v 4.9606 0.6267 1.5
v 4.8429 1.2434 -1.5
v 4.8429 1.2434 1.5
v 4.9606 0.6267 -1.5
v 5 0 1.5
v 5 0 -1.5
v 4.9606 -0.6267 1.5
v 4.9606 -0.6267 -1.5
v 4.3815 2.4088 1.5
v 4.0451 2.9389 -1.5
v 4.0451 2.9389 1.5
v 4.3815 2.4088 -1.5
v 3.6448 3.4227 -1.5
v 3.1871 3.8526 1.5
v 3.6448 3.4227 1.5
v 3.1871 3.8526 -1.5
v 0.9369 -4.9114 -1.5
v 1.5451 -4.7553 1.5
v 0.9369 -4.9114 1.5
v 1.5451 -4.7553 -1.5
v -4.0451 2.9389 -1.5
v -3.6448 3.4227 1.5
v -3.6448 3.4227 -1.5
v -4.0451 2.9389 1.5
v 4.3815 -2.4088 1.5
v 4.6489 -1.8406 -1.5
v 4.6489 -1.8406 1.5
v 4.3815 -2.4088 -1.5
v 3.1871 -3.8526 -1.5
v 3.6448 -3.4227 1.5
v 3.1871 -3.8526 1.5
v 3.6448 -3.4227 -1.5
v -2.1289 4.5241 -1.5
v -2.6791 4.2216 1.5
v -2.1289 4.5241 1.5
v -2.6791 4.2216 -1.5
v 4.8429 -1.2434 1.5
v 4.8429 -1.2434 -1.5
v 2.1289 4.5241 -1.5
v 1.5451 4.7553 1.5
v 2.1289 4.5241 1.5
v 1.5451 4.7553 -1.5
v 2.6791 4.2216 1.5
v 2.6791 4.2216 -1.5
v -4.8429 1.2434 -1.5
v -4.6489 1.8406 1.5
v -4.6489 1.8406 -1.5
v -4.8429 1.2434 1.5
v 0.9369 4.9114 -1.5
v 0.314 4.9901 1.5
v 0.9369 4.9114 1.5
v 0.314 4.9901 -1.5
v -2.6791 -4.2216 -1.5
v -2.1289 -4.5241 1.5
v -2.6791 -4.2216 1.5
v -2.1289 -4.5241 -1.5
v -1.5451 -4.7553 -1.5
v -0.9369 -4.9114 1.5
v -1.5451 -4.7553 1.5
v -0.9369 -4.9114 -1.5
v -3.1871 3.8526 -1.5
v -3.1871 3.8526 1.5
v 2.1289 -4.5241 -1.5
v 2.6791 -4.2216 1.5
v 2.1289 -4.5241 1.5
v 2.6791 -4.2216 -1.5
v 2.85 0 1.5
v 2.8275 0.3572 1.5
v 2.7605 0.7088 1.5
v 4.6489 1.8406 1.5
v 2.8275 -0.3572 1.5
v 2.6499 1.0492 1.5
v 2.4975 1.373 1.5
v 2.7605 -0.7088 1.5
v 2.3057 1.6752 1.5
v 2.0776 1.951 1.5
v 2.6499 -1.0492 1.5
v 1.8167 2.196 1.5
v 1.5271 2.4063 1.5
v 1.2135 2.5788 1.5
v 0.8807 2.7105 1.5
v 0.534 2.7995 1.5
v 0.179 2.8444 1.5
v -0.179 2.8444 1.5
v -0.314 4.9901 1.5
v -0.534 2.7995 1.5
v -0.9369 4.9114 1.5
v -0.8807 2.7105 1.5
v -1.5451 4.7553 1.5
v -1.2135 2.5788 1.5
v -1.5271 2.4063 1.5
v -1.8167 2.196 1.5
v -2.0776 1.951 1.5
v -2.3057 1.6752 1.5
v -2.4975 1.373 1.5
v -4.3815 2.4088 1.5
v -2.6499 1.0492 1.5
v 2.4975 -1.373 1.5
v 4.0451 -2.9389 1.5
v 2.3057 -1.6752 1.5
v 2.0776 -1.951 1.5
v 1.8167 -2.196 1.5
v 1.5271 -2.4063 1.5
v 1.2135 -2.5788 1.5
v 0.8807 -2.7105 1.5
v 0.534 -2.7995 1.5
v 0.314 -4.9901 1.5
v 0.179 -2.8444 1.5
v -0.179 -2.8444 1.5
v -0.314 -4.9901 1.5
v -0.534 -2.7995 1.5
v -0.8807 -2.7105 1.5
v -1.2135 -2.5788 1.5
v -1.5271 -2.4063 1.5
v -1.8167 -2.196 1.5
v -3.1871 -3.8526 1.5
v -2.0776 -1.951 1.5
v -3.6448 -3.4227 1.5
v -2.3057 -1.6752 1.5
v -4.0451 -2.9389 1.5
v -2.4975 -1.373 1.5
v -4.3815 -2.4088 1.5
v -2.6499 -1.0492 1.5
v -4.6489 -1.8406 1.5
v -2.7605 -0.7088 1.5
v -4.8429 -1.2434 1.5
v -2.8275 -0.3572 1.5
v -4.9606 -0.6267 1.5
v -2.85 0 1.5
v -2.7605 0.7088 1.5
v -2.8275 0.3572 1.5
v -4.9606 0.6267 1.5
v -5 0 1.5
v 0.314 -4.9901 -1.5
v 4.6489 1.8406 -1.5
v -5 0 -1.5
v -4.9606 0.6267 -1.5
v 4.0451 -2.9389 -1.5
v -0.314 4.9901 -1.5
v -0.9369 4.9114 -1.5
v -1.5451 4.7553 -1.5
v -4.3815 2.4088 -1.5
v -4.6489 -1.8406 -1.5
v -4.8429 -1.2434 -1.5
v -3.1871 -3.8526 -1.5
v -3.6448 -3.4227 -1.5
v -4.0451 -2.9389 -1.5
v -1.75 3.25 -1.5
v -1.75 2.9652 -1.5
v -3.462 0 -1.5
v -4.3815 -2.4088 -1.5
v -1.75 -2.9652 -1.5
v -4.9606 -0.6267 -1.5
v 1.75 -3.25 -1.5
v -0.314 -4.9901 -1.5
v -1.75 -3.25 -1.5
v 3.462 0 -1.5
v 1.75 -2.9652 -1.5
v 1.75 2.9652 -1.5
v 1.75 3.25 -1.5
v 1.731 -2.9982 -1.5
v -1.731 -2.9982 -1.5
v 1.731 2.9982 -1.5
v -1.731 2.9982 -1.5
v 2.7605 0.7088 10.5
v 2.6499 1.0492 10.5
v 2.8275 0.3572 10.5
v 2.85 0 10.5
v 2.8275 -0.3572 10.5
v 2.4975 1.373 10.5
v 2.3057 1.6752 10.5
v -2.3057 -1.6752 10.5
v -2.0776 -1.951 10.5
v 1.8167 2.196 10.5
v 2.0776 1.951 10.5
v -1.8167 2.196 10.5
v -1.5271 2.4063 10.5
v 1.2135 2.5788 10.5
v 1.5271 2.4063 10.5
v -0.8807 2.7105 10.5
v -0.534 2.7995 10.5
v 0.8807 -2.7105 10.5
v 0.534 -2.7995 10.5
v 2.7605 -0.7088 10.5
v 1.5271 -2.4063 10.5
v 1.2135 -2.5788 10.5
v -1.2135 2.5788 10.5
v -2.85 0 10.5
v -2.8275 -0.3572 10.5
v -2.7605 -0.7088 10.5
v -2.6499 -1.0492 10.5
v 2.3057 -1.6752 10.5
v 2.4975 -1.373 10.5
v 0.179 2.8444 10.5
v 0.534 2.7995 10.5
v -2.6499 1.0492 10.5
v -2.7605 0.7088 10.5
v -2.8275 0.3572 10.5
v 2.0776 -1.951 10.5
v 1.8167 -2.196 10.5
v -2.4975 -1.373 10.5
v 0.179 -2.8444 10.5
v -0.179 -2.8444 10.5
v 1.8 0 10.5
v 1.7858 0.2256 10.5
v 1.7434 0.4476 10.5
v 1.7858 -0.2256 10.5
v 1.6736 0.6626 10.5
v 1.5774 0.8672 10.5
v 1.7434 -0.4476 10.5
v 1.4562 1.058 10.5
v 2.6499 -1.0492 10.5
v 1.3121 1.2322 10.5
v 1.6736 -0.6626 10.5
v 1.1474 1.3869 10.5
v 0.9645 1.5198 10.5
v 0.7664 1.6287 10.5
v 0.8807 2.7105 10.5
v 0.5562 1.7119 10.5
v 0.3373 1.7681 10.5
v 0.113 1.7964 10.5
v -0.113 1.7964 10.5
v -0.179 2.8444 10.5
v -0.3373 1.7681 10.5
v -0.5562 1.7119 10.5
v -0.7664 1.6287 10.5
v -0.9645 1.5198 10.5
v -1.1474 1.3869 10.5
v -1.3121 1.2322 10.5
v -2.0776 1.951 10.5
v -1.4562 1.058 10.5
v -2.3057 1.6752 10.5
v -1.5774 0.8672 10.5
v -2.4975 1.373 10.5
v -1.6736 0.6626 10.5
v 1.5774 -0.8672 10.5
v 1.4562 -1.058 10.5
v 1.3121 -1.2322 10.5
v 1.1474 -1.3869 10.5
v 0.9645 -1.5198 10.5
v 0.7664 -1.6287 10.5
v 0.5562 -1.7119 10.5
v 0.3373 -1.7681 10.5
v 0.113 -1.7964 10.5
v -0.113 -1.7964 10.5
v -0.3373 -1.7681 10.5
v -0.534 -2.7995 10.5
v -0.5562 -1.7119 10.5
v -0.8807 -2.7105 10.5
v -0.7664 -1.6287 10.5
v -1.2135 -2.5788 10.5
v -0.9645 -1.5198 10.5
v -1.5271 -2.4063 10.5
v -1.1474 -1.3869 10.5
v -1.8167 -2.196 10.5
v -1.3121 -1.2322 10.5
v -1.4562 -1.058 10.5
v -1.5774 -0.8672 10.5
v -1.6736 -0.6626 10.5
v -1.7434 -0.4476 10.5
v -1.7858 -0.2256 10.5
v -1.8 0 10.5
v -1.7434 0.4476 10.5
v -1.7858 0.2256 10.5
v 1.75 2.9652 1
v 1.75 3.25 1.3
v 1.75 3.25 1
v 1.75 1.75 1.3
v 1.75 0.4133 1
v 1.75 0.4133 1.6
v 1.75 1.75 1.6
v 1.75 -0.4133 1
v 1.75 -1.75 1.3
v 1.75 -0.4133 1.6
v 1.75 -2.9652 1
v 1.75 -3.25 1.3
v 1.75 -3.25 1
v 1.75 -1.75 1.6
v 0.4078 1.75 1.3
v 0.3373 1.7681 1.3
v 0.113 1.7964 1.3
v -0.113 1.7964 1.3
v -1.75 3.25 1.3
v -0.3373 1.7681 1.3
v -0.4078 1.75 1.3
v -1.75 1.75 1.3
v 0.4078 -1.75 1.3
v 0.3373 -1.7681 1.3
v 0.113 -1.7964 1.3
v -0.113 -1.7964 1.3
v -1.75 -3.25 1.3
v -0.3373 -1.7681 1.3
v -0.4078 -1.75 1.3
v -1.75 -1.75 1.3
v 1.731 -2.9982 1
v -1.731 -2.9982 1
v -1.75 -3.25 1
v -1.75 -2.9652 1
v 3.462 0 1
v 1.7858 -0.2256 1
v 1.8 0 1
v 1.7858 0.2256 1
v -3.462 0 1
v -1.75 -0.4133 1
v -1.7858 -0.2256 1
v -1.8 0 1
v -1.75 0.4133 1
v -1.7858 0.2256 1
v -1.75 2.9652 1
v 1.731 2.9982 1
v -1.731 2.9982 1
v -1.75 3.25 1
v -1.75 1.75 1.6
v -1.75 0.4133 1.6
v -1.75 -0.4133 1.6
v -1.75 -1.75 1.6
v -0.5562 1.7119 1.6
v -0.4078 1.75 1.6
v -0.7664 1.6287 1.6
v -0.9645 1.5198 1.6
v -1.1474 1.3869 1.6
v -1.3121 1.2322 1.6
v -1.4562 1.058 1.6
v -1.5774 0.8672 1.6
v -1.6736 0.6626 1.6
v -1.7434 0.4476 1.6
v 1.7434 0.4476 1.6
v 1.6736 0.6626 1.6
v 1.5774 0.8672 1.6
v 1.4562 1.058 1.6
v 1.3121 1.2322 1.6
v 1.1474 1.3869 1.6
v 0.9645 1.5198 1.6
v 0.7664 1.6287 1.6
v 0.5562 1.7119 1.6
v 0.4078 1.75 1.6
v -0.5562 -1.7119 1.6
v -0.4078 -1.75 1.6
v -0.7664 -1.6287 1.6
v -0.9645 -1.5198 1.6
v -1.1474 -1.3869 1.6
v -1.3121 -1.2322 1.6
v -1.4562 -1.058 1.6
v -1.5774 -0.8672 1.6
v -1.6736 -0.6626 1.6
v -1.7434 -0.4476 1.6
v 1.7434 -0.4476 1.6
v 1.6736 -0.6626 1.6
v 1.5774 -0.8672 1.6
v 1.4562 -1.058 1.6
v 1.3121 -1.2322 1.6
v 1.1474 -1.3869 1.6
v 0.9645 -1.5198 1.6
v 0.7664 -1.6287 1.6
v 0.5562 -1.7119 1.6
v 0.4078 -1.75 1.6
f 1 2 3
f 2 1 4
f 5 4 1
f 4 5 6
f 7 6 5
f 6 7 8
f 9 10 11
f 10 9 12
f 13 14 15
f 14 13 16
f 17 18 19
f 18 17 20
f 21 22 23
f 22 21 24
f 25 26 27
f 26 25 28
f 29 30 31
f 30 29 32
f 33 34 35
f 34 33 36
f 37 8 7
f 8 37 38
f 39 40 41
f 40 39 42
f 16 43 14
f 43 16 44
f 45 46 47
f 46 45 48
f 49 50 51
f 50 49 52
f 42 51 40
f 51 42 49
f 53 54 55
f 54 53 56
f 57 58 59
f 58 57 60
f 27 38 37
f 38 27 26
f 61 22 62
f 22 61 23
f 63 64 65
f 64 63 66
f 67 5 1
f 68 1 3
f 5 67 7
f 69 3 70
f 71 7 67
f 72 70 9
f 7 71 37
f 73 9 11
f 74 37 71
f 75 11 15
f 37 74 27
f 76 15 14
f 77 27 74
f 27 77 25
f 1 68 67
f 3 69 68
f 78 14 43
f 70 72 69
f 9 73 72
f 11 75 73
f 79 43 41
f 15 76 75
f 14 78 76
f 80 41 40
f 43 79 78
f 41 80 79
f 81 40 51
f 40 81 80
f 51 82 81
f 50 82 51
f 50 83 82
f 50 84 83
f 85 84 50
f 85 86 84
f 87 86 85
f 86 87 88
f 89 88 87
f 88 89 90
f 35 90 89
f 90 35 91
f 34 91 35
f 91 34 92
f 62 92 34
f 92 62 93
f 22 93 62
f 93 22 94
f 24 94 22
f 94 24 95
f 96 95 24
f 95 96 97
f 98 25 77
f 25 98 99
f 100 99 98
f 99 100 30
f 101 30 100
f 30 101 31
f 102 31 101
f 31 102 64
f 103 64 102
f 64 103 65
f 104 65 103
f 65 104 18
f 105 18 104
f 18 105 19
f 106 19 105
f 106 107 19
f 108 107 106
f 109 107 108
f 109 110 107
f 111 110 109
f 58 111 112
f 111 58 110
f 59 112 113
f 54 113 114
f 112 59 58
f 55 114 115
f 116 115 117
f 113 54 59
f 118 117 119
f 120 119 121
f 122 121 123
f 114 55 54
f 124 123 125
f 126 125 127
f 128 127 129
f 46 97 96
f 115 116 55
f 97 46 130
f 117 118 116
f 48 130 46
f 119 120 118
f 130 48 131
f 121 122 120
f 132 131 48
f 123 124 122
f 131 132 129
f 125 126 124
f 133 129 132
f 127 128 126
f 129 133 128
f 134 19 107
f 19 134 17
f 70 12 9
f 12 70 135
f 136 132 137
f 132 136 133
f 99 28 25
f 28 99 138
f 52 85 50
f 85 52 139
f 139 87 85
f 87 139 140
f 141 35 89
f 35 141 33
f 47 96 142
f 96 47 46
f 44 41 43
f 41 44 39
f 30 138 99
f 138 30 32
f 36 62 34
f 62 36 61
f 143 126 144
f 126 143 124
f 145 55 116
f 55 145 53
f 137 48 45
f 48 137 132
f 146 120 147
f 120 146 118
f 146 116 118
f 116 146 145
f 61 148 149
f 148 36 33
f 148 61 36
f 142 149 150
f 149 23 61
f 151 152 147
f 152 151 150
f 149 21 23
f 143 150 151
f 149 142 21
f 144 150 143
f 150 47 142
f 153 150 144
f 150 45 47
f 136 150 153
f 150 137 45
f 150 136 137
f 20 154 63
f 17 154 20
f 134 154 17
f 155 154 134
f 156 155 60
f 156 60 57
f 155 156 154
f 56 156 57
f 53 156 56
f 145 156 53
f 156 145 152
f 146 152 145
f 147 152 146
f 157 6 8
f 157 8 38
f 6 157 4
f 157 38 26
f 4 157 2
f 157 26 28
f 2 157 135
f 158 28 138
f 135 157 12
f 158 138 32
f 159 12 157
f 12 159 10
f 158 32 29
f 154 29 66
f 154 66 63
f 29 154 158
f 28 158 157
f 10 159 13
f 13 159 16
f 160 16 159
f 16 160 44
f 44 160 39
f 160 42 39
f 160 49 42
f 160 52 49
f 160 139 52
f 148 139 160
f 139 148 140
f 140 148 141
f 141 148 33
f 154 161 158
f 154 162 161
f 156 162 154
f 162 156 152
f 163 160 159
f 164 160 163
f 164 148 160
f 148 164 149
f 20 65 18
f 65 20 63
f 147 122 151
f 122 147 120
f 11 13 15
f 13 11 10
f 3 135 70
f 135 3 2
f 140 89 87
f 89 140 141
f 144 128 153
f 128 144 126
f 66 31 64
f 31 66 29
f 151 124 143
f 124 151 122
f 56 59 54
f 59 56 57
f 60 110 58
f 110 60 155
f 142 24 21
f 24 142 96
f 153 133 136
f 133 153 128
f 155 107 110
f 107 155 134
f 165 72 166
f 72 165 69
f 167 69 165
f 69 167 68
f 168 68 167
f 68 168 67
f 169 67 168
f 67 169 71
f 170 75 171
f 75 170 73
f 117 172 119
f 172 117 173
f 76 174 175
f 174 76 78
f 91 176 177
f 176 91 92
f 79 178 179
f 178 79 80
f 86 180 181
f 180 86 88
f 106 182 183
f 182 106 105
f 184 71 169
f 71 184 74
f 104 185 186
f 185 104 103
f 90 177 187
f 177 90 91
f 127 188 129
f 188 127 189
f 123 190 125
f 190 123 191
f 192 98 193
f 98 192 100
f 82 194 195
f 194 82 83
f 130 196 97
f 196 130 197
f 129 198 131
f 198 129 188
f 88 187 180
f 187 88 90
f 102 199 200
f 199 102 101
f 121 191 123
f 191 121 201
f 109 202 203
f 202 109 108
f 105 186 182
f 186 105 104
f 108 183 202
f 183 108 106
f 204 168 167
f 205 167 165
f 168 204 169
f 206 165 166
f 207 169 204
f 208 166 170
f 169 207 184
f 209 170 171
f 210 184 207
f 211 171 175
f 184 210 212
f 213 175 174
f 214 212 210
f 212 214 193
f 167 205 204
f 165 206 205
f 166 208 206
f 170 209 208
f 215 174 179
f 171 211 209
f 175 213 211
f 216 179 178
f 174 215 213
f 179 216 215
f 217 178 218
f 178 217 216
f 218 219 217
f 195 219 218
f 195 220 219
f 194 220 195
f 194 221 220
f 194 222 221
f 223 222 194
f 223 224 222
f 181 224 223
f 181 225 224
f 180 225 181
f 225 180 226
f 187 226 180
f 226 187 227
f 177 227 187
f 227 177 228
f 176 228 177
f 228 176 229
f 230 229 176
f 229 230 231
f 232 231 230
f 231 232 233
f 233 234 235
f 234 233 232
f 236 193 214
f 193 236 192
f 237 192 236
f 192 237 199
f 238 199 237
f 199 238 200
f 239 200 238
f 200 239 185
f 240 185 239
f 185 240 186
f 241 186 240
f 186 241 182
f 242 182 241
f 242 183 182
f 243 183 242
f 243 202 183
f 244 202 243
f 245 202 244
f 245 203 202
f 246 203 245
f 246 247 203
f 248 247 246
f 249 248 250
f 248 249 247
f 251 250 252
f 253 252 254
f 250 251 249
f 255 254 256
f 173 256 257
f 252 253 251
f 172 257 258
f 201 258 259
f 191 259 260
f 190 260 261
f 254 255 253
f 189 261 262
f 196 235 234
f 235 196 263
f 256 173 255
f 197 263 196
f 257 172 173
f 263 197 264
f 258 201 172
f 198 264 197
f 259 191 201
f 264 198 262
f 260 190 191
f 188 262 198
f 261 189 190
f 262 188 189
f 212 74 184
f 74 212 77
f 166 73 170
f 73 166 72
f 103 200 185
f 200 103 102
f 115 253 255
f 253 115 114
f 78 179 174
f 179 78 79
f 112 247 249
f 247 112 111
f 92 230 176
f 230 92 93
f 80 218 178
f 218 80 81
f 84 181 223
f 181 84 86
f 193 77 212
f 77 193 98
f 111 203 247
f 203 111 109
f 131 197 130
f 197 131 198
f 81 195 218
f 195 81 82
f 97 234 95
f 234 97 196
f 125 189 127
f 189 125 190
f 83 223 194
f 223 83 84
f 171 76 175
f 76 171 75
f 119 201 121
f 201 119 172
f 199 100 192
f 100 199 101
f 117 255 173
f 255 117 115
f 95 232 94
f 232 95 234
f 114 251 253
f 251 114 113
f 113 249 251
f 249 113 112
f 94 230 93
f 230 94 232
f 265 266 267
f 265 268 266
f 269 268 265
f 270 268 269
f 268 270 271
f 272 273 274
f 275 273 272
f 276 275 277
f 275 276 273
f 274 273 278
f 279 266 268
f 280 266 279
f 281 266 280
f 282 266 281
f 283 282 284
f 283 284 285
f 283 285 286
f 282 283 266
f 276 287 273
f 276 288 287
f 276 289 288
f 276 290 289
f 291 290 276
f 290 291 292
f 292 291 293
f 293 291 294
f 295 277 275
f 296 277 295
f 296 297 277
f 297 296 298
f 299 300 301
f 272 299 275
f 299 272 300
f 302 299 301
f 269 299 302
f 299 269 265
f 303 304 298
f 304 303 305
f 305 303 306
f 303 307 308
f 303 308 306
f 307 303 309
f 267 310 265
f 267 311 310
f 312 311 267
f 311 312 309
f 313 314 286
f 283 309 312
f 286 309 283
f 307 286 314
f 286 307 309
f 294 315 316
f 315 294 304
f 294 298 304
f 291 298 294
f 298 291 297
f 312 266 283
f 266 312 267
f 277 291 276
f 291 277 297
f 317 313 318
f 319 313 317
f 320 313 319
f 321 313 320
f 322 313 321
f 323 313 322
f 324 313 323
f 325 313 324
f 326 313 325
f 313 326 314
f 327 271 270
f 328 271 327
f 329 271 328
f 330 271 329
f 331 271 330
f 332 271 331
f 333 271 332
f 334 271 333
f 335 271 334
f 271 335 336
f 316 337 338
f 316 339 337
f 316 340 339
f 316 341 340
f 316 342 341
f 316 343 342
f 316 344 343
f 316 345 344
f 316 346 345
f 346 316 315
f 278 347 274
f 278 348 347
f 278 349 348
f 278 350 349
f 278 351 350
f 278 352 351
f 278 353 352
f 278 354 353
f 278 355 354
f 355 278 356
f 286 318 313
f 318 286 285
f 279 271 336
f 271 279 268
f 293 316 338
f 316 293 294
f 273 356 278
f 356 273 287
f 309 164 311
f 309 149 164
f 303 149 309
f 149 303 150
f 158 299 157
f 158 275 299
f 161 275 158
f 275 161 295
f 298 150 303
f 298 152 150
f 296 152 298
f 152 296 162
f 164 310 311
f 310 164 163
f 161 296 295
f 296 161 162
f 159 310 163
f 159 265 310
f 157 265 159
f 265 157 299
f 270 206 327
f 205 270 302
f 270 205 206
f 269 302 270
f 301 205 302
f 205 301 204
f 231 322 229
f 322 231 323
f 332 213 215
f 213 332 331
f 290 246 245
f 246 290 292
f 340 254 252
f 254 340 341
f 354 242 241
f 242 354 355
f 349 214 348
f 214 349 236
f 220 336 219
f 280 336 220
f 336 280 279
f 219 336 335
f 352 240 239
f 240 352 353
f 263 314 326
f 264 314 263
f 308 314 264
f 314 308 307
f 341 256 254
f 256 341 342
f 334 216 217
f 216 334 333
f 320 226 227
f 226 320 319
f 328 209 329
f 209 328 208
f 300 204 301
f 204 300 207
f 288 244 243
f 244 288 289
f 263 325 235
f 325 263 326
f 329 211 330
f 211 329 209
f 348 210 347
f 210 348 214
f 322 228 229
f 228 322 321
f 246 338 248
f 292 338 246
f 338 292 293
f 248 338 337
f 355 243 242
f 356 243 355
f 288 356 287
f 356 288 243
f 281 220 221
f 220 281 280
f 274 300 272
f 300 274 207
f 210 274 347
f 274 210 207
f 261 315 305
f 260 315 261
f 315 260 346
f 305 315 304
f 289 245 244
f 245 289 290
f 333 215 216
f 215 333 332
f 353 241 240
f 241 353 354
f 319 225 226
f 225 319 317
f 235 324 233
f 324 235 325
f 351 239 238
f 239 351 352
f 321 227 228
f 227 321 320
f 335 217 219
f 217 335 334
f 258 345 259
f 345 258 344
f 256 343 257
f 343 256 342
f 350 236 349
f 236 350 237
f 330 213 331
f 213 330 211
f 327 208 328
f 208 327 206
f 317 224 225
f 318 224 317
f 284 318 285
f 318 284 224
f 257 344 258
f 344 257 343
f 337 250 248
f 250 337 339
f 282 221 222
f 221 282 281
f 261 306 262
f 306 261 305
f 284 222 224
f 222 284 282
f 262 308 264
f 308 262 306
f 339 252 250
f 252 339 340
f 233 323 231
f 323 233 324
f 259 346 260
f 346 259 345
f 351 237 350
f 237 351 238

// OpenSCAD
$fn = 50;


difference() {
	union() {
		translate(v = [0, 0, -1.5000000000]) {
			cylinder(h = 3, r = 5.0000000000);
		}
		translate(v = [0, 0, -1.5000000000]) {
			cylinder(h = 12, r = 2.8500000000);
		}
	}
	union() {
		translate(v = [0, 0, -1.5000000000]) {
			rotate(a = [0, 0, 0]) {
				difference() {
					union() {
						translate(v = [-1.7500000000, -3.2500000000, -0.3000000000]) {
							cube(size = [3.5000000000, 6.5000000000, 0.3000000000]);
						}
						translate(v = [-1.7500000000, -1.7500000000, -0.6000000000]) {
							cube(size = [3.5000000000, 3.5000000000, 0.3000000000]);
						}
						translate(v = [-1.7500000000, -3.2500000000, 2.5000000000]) {
							cube(size = [3.5000000000, 6.5000000000, 0.3000000000]);
						}
						translate(v = [-1.7500000000, -1.7500000000, 2.8000000000]) {
							cube(size = [3.5000000000, 3.5000000000, 0.3000000000]);
						}
						linear_extrude(height = 2.5000000000) {
							polygon(points = [[3.4620000000, 0.0000000000], [1.7310000000, 2.9981799479], [-1.7310000000, 2.9981799479], [-3.4620000000, 0.0000000000], [-1.7310000000, -2.9981799479], [1.7310000000, -2.9981799479]]);
						}
						translate(v = [-1.7500000000, -3.2500000000, -0.3000000000]) {
							cube(size = [3.5000000000, 6.5000000000, 0.3000000000]);
						}
						translate(v = [-1.7500000000, -1.7500000000, -0.6000000000]) {
							cube(size = [3.5000000000, 3.5000000000, 0.3000000000]);
						}
						translate(v = [-1.7500000000, -3.2500000000, 2.5000000000]) {
							cube(size = [3.5000000000, 6.5000000000, 0.3000000000]);
						}
						translate(v = [-1.7500000000, -1.7500000000, 2.8000000000]) {
							cube(size = [3.5000000000, 3.5000000000, 0.3000000000]);
						}
						translate(v = [-1.7500000000, -3.2500000000, -0.3000000000]) {
							cube(size = [3.5000000000, 6.5000000000, 0.3000000000]);
						}
						translate(v = [-1.7500000000, -1.7500000000, -0.6000000000]) {
							cube(size = [3.5000000000, 3.5000000000, 0.3000000000]);
						}
						translate(v = [-1.7500000000, -3.2500000000, 2.5000000000]) {
							cube(size = [3.5000000000, 6.5000000000, 0.3000000000]);
						}
						translate(v = [-1.7500000000, -1.7500000000, 2.8000000000]) {
							cube(size = [3.5000000000, 3.5000000000, 0.3000000000]);
						}
					}
					union();
				}
			}
		}
		translate(v = [0, 0, -100.0000000000]) {
			cylinder(h = 200, r = 1.8000000000);
		}
	}
}
